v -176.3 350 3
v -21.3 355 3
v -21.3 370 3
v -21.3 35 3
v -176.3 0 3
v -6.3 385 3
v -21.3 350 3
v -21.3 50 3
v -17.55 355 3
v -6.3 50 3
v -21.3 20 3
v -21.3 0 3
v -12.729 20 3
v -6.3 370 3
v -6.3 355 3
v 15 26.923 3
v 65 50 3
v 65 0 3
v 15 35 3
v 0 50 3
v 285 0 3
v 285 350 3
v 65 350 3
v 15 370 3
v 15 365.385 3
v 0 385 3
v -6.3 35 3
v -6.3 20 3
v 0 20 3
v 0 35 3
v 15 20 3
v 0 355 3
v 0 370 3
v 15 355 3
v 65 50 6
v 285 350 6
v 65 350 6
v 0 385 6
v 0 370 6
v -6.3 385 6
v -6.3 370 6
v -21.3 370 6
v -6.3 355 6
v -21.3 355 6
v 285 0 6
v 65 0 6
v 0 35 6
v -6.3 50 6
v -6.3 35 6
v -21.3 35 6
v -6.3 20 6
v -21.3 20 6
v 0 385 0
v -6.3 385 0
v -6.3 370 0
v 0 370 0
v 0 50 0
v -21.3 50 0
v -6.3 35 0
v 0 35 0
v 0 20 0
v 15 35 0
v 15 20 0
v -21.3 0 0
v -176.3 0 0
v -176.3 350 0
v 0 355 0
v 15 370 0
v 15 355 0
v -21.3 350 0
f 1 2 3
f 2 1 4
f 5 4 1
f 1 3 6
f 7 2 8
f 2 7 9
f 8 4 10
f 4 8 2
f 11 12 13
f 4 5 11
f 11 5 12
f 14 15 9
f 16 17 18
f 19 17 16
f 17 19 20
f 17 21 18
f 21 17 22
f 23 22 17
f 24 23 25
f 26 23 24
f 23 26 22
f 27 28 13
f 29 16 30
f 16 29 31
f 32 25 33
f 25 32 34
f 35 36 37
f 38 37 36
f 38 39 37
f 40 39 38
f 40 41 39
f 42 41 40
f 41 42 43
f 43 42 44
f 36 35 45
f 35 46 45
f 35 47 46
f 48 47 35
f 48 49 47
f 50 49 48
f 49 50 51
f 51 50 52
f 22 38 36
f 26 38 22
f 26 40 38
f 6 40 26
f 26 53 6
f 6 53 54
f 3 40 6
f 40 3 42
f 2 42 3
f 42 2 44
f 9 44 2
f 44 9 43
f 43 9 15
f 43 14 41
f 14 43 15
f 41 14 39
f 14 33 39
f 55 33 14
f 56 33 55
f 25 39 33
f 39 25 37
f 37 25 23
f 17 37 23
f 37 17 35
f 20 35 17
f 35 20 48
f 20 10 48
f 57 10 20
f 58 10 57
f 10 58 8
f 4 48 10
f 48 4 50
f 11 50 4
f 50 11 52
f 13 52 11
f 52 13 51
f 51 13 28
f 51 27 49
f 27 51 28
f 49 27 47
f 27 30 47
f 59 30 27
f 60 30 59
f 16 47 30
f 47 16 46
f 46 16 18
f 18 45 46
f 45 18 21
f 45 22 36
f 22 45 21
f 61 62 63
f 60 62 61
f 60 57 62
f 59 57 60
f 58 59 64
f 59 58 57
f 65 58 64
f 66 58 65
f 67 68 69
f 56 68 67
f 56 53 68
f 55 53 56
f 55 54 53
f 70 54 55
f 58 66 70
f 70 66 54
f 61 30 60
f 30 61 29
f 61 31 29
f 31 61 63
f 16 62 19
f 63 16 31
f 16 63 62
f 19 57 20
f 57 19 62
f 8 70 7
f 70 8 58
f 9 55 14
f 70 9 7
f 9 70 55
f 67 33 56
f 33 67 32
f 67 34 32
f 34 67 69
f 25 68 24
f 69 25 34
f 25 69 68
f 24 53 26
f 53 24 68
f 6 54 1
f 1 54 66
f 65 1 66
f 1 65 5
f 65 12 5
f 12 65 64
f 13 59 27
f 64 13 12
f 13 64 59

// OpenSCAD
//    Side:
//
//     |    A   B   C          D   
//     | s*| t*| c*|     d*   |
//   _    ______                _ M
//   s   /   *  ∖__              
//   _  /  _____   ∖__          _ N*
//   s |   |   |∖     ∖__
//   _ |___| x | ∖       ∖__    n* _ Ns       
//         |___|__∖         ∖   _ O
//             |   |         |  
//             | x |         |  
//             | x |         |  o
//             | x |         |            
//   _    _____|___|         |  _ P
//   s   /   *               |   
//   _  /  _____             |  _ Q
//   s |   |   |∖            |  
//   _ |___| x | ∖           |  q* _ Qs     
//         |___|  ∖__________|  _ _

module side(c, d) {

    A = $s;
    B = A + $w;
    C = B + c;
    D = C + d;
    Ns= $N - $s;
    M = $N + $s;
    N = $N;
    //do asserwion here
    O = $N - $n;
    P = $q + $s;
    Q = $q;
    //Do assertion here
    Qs= Q - $s;
    polygon([
        [0,Qs],
        [0, Q],
        [A, P],
        [C, P],
        [C, O],
        [B, N],
        [A, N],
        [A,Ns],
        [0,Ns],
        [0, N],
        [A, M],
        [B, M],
        [D, O],
        [D, 0],
        [C, 0],
        [B, Q],
        [A, Q],
        [A, Qs]
    ]);
}

//prusa i3:
$s = 15;
$w = 6.3;
$q = 35;
$O = 330;
$N = 370;
$n = 20;

step = 65;
acr = 3;

// front
translate([-($s + $w), 0 ,acr])
linear_extrude(acr)
side(step, 285-step);
// back
translate([$s, 0, 0])
linear_extrude(acr)
scale([-1, 1, 1]) 
side($s, 170-$s);
